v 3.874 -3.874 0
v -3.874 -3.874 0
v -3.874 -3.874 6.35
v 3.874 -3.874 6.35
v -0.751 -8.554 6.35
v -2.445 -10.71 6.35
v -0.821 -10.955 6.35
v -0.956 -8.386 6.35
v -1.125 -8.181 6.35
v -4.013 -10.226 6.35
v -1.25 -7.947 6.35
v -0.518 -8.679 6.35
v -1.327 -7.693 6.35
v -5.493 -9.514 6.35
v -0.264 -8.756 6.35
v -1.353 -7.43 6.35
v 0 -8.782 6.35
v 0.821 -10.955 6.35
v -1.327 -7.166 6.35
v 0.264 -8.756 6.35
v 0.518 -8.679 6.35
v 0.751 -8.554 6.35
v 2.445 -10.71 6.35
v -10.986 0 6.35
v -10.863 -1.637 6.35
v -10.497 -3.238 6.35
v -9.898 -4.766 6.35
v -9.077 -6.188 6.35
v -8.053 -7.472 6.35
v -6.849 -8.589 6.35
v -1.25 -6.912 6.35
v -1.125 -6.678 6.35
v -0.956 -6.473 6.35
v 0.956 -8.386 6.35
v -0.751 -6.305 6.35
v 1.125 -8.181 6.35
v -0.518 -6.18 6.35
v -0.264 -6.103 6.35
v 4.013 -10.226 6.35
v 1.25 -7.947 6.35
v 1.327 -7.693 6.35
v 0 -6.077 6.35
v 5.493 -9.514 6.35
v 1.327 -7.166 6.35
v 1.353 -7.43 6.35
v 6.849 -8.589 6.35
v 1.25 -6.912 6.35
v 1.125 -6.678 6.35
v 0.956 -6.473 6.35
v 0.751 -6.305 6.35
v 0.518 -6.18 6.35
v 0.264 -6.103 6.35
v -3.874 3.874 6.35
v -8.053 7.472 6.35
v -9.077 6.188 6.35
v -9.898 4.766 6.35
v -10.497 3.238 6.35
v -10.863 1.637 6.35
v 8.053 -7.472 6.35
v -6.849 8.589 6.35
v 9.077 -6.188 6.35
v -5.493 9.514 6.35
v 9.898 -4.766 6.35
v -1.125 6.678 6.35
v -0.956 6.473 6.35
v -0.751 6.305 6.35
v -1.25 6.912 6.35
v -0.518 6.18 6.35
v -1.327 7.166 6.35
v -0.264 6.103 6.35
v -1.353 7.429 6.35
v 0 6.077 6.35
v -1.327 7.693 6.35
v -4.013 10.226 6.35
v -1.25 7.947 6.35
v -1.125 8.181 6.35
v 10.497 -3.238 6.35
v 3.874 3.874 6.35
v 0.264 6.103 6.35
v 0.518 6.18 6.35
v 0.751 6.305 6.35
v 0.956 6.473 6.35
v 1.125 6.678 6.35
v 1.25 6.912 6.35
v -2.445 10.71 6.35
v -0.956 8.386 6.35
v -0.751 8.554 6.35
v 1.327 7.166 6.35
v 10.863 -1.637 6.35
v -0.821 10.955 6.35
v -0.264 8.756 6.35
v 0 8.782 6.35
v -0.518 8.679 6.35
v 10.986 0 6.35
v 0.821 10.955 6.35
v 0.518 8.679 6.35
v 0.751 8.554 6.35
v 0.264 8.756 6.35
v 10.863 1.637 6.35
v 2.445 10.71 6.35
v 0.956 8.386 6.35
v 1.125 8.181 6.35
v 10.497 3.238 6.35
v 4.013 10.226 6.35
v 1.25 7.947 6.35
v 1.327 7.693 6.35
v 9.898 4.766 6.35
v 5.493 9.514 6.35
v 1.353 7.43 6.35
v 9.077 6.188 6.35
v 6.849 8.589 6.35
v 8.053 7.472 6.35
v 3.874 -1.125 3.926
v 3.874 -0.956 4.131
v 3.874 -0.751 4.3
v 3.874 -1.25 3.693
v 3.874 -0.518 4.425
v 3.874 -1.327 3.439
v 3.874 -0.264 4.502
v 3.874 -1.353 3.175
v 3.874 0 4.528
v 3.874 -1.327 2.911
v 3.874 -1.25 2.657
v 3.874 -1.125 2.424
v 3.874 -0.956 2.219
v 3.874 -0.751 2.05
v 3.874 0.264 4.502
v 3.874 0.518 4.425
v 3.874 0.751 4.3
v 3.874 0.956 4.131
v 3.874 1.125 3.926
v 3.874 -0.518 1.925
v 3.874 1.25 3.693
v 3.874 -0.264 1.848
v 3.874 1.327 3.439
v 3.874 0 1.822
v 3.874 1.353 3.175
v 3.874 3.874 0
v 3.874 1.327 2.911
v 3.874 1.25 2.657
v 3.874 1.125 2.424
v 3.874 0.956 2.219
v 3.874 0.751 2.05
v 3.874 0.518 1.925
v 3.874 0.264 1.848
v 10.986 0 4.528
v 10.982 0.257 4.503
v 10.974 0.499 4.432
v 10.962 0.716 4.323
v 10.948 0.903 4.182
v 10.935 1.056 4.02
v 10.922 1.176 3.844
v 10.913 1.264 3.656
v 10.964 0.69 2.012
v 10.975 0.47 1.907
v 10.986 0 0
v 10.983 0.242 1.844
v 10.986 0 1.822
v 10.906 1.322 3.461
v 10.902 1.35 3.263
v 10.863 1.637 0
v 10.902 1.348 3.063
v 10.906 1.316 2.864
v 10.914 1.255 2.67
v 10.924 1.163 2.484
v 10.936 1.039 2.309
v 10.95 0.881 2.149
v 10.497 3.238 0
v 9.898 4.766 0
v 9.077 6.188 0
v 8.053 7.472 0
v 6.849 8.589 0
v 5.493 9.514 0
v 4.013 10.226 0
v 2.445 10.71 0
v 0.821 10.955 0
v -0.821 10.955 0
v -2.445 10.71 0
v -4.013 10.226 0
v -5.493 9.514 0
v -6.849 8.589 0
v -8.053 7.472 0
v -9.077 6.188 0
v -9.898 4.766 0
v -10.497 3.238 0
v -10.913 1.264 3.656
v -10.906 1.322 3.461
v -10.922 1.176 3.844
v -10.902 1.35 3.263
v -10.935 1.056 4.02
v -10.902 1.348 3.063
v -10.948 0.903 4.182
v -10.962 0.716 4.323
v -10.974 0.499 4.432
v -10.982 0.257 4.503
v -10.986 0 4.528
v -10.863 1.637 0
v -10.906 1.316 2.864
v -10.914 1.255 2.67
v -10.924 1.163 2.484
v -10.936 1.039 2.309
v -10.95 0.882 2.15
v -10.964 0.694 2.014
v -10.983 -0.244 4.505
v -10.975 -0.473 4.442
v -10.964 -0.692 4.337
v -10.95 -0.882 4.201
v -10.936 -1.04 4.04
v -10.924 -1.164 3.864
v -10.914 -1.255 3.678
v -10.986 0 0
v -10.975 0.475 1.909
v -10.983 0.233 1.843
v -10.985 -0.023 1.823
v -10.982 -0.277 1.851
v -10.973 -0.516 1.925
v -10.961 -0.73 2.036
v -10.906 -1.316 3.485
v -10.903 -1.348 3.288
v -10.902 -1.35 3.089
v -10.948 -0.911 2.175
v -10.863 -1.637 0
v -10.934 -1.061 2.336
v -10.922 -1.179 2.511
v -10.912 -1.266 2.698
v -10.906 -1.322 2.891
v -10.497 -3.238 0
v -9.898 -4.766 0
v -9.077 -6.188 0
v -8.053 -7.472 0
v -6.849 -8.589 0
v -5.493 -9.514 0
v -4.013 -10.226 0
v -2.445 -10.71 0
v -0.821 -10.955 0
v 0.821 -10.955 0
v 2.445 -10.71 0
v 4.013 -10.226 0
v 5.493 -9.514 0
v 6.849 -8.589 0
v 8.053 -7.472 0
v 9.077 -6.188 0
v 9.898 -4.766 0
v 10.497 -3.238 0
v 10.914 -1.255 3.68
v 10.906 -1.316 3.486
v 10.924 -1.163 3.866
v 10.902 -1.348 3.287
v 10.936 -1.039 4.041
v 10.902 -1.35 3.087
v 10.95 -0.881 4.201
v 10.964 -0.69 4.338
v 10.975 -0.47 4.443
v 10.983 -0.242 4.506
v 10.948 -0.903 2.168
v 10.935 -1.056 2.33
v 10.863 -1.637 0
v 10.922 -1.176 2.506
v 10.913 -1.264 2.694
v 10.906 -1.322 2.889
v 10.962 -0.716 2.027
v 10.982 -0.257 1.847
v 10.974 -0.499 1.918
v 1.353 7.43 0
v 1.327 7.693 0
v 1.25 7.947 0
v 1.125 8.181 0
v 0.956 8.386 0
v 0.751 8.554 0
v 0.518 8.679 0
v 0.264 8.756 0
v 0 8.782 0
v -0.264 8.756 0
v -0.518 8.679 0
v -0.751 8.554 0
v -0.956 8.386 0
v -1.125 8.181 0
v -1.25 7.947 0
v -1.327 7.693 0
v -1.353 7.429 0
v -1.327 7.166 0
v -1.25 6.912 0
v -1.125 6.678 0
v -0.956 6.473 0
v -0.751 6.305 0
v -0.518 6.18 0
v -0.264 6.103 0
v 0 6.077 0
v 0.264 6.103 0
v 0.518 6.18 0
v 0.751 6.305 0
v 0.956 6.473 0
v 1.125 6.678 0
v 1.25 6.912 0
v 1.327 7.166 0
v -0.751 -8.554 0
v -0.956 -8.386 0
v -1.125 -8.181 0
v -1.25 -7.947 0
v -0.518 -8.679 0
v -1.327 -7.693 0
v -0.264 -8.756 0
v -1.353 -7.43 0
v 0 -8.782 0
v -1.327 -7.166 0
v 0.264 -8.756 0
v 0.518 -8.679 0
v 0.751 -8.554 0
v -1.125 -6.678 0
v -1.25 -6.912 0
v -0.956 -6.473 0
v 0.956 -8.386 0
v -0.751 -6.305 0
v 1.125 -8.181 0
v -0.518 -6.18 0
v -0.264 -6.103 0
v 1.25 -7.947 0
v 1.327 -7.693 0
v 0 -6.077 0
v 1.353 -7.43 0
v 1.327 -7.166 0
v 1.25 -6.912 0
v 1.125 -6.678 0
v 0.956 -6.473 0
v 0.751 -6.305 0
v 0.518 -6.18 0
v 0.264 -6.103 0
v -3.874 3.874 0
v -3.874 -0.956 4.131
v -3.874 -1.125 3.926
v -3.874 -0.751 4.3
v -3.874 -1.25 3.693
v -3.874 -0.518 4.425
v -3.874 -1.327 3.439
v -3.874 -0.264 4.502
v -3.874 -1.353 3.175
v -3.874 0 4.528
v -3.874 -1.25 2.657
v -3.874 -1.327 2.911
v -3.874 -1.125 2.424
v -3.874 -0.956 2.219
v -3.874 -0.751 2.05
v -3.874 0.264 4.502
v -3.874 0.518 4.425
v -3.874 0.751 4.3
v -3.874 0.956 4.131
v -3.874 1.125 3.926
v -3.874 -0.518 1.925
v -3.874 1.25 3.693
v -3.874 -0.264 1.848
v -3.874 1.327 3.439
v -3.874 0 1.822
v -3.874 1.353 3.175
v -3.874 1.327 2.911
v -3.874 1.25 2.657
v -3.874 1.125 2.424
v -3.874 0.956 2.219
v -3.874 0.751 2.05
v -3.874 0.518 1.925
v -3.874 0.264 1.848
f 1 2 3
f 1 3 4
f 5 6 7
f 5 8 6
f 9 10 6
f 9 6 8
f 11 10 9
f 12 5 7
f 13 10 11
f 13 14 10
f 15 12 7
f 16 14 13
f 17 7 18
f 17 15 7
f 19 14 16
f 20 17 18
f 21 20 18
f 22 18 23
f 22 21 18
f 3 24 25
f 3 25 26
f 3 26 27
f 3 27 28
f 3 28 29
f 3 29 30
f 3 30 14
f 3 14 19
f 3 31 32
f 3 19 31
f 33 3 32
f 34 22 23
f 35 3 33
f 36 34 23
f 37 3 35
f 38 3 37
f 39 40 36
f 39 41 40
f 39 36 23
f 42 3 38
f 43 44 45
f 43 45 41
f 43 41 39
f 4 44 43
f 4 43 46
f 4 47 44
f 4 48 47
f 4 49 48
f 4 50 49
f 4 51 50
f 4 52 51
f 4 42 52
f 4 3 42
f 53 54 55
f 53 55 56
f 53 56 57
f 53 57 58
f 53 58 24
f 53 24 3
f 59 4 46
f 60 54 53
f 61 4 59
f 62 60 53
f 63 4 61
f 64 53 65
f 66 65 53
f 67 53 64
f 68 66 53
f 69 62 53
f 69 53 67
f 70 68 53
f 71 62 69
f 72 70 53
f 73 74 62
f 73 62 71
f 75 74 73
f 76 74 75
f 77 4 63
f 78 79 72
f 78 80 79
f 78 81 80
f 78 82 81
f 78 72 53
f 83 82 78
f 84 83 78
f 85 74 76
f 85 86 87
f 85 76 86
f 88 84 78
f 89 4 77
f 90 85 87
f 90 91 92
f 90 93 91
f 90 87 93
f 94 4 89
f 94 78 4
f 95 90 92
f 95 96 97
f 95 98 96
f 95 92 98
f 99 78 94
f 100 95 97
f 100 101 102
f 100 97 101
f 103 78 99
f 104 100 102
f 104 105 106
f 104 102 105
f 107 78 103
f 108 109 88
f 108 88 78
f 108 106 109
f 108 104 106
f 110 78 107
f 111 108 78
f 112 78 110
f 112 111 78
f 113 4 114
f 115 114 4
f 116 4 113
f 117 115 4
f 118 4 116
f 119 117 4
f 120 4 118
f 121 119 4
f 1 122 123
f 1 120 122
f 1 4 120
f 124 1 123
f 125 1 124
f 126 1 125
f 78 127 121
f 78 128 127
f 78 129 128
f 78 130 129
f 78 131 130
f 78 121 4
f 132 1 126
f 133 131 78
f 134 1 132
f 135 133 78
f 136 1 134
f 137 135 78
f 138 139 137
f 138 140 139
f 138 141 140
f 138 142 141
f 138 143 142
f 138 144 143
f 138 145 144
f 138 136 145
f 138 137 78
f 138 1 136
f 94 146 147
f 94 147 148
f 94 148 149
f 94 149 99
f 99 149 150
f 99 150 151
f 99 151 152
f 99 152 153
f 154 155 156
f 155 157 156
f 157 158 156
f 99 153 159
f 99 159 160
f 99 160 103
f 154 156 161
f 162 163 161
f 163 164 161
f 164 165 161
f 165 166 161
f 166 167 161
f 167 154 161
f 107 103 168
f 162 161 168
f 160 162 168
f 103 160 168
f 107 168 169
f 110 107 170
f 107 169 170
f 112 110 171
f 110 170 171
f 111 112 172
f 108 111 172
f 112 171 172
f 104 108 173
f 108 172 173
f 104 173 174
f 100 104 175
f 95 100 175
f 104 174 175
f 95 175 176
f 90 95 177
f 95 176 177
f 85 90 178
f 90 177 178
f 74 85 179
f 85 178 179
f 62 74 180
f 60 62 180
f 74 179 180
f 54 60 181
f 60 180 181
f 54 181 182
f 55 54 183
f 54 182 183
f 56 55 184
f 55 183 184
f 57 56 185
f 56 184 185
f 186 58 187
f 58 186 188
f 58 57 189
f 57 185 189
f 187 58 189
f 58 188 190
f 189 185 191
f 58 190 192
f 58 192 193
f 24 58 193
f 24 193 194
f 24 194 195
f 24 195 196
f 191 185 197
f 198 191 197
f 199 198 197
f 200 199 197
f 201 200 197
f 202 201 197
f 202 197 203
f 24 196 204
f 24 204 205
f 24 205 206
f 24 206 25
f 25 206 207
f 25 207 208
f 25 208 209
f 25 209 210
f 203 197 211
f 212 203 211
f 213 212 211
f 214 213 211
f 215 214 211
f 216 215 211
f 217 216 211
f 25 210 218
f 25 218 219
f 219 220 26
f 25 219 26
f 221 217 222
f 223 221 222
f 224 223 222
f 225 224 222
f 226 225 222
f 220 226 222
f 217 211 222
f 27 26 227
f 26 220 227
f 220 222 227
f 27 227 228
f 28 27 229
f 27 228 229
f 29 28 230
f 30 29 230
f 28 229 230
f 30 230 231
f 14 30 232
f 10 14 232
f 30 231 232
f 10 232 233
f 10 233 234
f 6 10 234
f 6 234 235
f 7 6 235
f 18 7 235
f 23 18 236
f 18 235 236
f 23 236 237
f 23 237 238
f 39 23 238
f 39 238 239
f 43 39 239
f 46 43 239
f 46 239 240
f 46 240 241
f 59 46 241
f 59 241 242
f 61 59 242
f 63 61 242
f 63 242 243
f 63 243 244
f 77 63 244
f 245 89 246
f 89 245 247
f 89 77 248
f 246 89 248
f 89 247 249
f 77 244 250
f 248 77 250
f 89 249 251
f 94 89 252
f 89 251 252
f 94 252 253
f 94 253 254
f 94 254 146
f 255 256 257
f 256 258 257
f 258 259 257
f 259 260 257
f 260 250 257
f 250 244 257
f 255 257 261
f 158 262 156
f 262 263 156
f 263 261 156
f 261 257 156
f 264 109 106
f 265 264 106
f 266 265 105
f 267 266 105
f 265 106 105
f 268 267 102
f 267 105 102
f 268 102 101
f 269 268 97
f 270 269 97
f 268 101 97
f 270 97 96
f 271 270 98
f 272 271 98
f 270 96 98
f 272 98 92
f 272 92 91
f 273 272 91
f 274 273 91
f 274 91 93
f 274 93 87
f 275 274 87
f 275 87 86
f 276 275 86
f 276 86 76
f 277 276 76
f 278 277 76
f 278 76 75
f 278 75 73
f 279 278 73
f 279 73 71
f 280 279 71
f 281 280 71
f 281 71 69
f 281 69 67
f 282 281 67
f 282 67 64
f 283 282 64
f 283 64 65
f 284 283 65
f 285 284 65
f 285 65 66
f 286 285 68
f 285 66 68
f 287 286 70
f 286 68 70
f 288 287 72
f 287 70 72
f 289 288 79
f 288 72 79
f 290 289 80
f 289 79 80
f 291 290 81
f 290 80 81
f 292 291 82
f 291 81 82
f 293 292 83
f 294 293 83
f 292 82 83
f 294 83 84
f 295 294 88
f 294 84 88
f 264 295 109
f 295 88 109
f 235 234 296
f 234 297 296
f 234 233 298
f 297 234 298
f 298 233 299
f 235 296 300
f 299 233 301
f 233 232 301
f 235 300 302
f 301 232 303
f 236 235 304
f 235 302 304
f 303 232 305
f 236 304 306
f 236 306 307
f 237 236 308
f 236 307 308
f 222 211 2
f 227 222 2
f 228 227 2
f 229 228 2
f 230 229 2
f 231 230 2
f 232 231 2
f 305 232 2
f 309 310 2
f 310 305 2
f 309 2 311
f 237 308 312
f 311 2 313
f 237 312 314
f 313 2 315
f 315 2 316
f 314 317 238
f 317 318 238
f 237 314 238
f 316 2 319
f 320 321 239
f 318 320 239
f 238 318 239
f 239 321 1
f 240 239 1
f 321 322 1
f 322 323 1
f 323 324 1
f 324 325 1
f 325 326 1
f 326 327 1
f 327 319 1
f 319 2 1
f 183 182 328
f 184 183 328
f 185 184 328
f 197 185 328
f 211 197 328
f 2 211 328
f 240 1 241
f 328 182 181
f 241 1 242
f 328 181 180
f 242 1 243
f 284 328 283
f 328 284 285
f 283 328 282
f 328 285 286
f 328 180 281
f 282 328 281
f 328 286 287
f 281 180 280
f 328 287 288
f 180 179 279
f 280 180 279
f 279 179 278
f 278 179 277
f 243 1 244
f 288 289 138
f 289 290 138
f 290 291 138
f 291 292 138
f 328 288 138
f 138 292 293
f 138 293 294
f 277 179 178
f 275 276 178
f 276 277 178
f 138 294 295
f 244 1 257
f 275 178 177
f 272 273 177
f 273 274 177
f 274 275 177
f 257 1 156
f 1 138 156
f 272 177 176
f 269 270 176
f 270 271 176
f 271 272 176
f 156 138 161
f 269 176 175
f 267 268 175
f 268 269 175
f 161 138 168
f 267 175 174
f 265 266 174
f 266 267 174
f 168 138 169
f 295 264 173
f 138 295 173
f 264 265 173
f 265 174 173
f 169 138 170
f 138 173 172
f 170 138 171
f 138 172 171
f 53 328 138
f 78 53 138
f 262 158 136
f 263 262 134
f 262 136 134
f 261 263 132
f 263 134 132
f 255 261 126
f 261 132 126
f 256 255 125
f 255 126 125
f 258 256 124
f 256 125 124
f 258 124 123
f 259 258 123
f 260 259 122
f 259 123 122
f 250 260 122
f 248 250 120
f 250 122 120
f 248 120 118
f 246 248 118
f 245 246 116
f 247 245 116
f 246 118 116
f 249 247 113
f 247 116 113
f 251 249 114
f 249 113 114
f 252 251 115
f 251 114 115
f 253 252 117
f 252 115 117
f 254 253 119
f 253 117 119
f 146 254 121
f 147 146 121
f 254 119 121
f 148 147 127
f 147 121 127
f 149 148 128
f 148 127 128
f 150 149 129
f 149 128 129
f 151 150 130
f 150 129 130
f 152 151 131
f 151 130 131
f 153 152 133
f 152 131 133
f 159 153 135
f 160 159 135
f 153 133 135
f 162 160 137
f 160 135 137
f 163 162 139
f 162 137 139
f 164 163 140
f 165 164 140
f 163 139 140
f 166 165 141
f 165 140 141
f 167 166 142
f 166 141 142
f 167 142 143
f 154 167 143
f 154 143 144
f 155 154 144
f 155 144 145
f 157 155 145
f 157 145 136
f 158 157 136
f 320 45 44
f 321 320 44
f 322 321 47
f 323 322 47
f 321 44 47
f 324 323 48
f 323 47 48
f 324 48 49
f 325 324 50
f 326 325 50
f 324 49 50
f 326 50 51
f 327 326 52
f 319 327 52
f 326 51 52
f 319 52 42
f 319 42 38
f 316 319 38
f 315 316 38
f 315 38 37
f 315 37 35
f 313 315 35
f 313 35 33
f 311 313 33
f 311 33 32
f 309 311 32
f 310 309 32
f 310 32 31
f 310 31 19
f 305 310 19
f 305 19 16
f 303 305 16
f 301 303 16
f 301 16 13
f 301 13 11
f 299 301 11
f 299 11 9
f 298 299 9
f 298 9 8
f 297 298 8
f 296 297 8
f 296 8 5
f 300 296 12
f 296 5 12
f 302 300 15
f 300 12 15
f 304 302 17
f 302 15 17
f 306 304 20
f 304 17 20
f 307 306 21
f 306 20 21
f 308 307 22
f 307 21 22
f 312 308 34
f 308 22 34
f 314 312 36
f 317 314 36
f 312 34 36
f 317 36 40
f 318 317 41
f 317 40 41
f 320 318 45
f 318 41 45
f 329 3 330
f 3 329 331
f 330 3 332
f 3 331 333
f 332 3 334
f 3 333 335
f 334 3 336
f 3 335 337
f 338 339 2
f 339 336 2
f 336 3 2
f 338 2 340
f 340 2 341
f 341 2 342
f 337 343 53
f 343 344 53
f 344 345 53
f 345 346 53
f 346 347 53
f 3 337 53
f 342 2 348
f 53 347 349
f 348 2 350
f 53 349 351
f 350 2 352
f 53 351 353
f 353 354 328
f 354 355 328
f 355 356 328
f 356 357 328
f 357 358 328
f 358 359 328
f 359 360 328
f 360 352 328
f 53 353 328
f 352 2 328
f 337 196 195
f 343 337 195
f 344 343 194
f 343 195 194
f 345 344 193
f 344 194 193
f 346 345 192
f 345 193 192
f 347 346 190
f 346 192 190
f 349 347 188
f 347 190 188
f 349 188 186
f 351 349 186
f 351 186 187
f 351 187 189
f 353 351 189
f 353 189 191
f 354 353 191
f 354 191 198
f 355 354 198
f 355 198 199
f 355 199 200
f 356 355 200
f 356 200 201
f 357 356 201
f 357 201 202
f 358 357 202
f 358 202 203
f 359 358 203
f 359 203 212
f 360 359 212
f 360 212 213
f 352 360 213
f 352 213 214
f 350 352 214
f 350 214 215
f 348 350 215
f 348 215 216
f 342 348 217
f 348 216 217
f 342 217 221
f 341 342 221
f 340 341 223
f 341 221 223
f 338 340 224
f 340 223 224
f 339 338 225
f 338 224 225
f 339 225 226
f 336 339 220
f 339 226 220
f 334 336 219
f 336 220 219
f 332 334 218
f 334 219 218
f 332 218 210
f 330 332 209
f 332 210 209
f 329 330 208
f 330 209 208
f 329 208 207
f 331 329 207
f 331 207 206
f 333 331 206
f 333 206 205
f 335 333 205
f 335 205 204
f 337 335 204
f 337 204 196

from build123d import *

# Parameters (mm, degrees)
SKETCH1_R                           = 10.9855
SKETCH1_W                           = 7.747
SKETCH1_H                           = 7.747
BOSS_EXTRUDE1_DEPTH                 = 6.35
F_6_32_TAPPED_HOLE1_D               = 2.7051
F_6_32_TAPPED_HOLE1_DEPTH           = 7.112
F_6_32_TAPPED_HOLE1_ON_FACE_2_D     = 2.7051
F_6_32_TAPPED_HOLE1_ON_FACE_2_DEPTH = 7.112
F_6_32_TAPPED_HOLE2_D               = 2.7051
F_6_32_TAPPED_HOLE4_D               = 2.7051


with BuildPart() as part:
    # Sketch1 → Boss-Extrude1 (new body)
    with BuildSketch(Plane.XY):
        Circle(SKETCH1_R)
        Rectangle(SKETCH1_W, SKETCH1_H, mode=Mode.SUBTRACT)
    extrude(amount=BOSS_EXTRUDE1_DEPTH)

    # #6-32 Tapped Hole1
    with Locations(Plane(origin=(10.9855, 0, 3.175), x_dir=(0, 0, 1), z_dir=(1, 0, 0))):
        with Locations((0, 0)):
            Hole(F_6_32_TAPPED_HOLE1_D / 2, depth=F_6_32_TAPPED_HOLE1_DEPTH)

    # #6-32 Tapped Hole1 on face 2
    with Locations(Plane(origin=(3.8735, 0, 3.175), x_dir=(0, 0, -1), z_dir=(-1, 0, 0))):
        with Locations((0, 0)):
            Hole(F_6_32_TAPPED_HOLE1_ON_FACE_2_D / 2, depth=F_6_32_TAPPED_HOLE1_ON_FACE_2_DEPTH)

    # #6-32 Tapped Hole2 (through all)
    with Locations(Plane(origin=(-3.8735, 0, 0), x_dir=(0, 0, -1), z_dir=(1, 0, 0))):
        with Locations((-3.175, 0)):
            Hole(F_6_32_TAPPED_HOLE2_D / 2)

    # #6-32 Tapped Hole4 (through all)
    with Locations(Plane(origin=(0, 0, 0), x_dir=(-1, 0, 0), z_dir=(0, 0, -1))):
        with Locations((0, -7.4295), (0, 7.4295)):
            Hole(F_6_32_TAPPED_HOLE4_D / 2)


solid = part.part
